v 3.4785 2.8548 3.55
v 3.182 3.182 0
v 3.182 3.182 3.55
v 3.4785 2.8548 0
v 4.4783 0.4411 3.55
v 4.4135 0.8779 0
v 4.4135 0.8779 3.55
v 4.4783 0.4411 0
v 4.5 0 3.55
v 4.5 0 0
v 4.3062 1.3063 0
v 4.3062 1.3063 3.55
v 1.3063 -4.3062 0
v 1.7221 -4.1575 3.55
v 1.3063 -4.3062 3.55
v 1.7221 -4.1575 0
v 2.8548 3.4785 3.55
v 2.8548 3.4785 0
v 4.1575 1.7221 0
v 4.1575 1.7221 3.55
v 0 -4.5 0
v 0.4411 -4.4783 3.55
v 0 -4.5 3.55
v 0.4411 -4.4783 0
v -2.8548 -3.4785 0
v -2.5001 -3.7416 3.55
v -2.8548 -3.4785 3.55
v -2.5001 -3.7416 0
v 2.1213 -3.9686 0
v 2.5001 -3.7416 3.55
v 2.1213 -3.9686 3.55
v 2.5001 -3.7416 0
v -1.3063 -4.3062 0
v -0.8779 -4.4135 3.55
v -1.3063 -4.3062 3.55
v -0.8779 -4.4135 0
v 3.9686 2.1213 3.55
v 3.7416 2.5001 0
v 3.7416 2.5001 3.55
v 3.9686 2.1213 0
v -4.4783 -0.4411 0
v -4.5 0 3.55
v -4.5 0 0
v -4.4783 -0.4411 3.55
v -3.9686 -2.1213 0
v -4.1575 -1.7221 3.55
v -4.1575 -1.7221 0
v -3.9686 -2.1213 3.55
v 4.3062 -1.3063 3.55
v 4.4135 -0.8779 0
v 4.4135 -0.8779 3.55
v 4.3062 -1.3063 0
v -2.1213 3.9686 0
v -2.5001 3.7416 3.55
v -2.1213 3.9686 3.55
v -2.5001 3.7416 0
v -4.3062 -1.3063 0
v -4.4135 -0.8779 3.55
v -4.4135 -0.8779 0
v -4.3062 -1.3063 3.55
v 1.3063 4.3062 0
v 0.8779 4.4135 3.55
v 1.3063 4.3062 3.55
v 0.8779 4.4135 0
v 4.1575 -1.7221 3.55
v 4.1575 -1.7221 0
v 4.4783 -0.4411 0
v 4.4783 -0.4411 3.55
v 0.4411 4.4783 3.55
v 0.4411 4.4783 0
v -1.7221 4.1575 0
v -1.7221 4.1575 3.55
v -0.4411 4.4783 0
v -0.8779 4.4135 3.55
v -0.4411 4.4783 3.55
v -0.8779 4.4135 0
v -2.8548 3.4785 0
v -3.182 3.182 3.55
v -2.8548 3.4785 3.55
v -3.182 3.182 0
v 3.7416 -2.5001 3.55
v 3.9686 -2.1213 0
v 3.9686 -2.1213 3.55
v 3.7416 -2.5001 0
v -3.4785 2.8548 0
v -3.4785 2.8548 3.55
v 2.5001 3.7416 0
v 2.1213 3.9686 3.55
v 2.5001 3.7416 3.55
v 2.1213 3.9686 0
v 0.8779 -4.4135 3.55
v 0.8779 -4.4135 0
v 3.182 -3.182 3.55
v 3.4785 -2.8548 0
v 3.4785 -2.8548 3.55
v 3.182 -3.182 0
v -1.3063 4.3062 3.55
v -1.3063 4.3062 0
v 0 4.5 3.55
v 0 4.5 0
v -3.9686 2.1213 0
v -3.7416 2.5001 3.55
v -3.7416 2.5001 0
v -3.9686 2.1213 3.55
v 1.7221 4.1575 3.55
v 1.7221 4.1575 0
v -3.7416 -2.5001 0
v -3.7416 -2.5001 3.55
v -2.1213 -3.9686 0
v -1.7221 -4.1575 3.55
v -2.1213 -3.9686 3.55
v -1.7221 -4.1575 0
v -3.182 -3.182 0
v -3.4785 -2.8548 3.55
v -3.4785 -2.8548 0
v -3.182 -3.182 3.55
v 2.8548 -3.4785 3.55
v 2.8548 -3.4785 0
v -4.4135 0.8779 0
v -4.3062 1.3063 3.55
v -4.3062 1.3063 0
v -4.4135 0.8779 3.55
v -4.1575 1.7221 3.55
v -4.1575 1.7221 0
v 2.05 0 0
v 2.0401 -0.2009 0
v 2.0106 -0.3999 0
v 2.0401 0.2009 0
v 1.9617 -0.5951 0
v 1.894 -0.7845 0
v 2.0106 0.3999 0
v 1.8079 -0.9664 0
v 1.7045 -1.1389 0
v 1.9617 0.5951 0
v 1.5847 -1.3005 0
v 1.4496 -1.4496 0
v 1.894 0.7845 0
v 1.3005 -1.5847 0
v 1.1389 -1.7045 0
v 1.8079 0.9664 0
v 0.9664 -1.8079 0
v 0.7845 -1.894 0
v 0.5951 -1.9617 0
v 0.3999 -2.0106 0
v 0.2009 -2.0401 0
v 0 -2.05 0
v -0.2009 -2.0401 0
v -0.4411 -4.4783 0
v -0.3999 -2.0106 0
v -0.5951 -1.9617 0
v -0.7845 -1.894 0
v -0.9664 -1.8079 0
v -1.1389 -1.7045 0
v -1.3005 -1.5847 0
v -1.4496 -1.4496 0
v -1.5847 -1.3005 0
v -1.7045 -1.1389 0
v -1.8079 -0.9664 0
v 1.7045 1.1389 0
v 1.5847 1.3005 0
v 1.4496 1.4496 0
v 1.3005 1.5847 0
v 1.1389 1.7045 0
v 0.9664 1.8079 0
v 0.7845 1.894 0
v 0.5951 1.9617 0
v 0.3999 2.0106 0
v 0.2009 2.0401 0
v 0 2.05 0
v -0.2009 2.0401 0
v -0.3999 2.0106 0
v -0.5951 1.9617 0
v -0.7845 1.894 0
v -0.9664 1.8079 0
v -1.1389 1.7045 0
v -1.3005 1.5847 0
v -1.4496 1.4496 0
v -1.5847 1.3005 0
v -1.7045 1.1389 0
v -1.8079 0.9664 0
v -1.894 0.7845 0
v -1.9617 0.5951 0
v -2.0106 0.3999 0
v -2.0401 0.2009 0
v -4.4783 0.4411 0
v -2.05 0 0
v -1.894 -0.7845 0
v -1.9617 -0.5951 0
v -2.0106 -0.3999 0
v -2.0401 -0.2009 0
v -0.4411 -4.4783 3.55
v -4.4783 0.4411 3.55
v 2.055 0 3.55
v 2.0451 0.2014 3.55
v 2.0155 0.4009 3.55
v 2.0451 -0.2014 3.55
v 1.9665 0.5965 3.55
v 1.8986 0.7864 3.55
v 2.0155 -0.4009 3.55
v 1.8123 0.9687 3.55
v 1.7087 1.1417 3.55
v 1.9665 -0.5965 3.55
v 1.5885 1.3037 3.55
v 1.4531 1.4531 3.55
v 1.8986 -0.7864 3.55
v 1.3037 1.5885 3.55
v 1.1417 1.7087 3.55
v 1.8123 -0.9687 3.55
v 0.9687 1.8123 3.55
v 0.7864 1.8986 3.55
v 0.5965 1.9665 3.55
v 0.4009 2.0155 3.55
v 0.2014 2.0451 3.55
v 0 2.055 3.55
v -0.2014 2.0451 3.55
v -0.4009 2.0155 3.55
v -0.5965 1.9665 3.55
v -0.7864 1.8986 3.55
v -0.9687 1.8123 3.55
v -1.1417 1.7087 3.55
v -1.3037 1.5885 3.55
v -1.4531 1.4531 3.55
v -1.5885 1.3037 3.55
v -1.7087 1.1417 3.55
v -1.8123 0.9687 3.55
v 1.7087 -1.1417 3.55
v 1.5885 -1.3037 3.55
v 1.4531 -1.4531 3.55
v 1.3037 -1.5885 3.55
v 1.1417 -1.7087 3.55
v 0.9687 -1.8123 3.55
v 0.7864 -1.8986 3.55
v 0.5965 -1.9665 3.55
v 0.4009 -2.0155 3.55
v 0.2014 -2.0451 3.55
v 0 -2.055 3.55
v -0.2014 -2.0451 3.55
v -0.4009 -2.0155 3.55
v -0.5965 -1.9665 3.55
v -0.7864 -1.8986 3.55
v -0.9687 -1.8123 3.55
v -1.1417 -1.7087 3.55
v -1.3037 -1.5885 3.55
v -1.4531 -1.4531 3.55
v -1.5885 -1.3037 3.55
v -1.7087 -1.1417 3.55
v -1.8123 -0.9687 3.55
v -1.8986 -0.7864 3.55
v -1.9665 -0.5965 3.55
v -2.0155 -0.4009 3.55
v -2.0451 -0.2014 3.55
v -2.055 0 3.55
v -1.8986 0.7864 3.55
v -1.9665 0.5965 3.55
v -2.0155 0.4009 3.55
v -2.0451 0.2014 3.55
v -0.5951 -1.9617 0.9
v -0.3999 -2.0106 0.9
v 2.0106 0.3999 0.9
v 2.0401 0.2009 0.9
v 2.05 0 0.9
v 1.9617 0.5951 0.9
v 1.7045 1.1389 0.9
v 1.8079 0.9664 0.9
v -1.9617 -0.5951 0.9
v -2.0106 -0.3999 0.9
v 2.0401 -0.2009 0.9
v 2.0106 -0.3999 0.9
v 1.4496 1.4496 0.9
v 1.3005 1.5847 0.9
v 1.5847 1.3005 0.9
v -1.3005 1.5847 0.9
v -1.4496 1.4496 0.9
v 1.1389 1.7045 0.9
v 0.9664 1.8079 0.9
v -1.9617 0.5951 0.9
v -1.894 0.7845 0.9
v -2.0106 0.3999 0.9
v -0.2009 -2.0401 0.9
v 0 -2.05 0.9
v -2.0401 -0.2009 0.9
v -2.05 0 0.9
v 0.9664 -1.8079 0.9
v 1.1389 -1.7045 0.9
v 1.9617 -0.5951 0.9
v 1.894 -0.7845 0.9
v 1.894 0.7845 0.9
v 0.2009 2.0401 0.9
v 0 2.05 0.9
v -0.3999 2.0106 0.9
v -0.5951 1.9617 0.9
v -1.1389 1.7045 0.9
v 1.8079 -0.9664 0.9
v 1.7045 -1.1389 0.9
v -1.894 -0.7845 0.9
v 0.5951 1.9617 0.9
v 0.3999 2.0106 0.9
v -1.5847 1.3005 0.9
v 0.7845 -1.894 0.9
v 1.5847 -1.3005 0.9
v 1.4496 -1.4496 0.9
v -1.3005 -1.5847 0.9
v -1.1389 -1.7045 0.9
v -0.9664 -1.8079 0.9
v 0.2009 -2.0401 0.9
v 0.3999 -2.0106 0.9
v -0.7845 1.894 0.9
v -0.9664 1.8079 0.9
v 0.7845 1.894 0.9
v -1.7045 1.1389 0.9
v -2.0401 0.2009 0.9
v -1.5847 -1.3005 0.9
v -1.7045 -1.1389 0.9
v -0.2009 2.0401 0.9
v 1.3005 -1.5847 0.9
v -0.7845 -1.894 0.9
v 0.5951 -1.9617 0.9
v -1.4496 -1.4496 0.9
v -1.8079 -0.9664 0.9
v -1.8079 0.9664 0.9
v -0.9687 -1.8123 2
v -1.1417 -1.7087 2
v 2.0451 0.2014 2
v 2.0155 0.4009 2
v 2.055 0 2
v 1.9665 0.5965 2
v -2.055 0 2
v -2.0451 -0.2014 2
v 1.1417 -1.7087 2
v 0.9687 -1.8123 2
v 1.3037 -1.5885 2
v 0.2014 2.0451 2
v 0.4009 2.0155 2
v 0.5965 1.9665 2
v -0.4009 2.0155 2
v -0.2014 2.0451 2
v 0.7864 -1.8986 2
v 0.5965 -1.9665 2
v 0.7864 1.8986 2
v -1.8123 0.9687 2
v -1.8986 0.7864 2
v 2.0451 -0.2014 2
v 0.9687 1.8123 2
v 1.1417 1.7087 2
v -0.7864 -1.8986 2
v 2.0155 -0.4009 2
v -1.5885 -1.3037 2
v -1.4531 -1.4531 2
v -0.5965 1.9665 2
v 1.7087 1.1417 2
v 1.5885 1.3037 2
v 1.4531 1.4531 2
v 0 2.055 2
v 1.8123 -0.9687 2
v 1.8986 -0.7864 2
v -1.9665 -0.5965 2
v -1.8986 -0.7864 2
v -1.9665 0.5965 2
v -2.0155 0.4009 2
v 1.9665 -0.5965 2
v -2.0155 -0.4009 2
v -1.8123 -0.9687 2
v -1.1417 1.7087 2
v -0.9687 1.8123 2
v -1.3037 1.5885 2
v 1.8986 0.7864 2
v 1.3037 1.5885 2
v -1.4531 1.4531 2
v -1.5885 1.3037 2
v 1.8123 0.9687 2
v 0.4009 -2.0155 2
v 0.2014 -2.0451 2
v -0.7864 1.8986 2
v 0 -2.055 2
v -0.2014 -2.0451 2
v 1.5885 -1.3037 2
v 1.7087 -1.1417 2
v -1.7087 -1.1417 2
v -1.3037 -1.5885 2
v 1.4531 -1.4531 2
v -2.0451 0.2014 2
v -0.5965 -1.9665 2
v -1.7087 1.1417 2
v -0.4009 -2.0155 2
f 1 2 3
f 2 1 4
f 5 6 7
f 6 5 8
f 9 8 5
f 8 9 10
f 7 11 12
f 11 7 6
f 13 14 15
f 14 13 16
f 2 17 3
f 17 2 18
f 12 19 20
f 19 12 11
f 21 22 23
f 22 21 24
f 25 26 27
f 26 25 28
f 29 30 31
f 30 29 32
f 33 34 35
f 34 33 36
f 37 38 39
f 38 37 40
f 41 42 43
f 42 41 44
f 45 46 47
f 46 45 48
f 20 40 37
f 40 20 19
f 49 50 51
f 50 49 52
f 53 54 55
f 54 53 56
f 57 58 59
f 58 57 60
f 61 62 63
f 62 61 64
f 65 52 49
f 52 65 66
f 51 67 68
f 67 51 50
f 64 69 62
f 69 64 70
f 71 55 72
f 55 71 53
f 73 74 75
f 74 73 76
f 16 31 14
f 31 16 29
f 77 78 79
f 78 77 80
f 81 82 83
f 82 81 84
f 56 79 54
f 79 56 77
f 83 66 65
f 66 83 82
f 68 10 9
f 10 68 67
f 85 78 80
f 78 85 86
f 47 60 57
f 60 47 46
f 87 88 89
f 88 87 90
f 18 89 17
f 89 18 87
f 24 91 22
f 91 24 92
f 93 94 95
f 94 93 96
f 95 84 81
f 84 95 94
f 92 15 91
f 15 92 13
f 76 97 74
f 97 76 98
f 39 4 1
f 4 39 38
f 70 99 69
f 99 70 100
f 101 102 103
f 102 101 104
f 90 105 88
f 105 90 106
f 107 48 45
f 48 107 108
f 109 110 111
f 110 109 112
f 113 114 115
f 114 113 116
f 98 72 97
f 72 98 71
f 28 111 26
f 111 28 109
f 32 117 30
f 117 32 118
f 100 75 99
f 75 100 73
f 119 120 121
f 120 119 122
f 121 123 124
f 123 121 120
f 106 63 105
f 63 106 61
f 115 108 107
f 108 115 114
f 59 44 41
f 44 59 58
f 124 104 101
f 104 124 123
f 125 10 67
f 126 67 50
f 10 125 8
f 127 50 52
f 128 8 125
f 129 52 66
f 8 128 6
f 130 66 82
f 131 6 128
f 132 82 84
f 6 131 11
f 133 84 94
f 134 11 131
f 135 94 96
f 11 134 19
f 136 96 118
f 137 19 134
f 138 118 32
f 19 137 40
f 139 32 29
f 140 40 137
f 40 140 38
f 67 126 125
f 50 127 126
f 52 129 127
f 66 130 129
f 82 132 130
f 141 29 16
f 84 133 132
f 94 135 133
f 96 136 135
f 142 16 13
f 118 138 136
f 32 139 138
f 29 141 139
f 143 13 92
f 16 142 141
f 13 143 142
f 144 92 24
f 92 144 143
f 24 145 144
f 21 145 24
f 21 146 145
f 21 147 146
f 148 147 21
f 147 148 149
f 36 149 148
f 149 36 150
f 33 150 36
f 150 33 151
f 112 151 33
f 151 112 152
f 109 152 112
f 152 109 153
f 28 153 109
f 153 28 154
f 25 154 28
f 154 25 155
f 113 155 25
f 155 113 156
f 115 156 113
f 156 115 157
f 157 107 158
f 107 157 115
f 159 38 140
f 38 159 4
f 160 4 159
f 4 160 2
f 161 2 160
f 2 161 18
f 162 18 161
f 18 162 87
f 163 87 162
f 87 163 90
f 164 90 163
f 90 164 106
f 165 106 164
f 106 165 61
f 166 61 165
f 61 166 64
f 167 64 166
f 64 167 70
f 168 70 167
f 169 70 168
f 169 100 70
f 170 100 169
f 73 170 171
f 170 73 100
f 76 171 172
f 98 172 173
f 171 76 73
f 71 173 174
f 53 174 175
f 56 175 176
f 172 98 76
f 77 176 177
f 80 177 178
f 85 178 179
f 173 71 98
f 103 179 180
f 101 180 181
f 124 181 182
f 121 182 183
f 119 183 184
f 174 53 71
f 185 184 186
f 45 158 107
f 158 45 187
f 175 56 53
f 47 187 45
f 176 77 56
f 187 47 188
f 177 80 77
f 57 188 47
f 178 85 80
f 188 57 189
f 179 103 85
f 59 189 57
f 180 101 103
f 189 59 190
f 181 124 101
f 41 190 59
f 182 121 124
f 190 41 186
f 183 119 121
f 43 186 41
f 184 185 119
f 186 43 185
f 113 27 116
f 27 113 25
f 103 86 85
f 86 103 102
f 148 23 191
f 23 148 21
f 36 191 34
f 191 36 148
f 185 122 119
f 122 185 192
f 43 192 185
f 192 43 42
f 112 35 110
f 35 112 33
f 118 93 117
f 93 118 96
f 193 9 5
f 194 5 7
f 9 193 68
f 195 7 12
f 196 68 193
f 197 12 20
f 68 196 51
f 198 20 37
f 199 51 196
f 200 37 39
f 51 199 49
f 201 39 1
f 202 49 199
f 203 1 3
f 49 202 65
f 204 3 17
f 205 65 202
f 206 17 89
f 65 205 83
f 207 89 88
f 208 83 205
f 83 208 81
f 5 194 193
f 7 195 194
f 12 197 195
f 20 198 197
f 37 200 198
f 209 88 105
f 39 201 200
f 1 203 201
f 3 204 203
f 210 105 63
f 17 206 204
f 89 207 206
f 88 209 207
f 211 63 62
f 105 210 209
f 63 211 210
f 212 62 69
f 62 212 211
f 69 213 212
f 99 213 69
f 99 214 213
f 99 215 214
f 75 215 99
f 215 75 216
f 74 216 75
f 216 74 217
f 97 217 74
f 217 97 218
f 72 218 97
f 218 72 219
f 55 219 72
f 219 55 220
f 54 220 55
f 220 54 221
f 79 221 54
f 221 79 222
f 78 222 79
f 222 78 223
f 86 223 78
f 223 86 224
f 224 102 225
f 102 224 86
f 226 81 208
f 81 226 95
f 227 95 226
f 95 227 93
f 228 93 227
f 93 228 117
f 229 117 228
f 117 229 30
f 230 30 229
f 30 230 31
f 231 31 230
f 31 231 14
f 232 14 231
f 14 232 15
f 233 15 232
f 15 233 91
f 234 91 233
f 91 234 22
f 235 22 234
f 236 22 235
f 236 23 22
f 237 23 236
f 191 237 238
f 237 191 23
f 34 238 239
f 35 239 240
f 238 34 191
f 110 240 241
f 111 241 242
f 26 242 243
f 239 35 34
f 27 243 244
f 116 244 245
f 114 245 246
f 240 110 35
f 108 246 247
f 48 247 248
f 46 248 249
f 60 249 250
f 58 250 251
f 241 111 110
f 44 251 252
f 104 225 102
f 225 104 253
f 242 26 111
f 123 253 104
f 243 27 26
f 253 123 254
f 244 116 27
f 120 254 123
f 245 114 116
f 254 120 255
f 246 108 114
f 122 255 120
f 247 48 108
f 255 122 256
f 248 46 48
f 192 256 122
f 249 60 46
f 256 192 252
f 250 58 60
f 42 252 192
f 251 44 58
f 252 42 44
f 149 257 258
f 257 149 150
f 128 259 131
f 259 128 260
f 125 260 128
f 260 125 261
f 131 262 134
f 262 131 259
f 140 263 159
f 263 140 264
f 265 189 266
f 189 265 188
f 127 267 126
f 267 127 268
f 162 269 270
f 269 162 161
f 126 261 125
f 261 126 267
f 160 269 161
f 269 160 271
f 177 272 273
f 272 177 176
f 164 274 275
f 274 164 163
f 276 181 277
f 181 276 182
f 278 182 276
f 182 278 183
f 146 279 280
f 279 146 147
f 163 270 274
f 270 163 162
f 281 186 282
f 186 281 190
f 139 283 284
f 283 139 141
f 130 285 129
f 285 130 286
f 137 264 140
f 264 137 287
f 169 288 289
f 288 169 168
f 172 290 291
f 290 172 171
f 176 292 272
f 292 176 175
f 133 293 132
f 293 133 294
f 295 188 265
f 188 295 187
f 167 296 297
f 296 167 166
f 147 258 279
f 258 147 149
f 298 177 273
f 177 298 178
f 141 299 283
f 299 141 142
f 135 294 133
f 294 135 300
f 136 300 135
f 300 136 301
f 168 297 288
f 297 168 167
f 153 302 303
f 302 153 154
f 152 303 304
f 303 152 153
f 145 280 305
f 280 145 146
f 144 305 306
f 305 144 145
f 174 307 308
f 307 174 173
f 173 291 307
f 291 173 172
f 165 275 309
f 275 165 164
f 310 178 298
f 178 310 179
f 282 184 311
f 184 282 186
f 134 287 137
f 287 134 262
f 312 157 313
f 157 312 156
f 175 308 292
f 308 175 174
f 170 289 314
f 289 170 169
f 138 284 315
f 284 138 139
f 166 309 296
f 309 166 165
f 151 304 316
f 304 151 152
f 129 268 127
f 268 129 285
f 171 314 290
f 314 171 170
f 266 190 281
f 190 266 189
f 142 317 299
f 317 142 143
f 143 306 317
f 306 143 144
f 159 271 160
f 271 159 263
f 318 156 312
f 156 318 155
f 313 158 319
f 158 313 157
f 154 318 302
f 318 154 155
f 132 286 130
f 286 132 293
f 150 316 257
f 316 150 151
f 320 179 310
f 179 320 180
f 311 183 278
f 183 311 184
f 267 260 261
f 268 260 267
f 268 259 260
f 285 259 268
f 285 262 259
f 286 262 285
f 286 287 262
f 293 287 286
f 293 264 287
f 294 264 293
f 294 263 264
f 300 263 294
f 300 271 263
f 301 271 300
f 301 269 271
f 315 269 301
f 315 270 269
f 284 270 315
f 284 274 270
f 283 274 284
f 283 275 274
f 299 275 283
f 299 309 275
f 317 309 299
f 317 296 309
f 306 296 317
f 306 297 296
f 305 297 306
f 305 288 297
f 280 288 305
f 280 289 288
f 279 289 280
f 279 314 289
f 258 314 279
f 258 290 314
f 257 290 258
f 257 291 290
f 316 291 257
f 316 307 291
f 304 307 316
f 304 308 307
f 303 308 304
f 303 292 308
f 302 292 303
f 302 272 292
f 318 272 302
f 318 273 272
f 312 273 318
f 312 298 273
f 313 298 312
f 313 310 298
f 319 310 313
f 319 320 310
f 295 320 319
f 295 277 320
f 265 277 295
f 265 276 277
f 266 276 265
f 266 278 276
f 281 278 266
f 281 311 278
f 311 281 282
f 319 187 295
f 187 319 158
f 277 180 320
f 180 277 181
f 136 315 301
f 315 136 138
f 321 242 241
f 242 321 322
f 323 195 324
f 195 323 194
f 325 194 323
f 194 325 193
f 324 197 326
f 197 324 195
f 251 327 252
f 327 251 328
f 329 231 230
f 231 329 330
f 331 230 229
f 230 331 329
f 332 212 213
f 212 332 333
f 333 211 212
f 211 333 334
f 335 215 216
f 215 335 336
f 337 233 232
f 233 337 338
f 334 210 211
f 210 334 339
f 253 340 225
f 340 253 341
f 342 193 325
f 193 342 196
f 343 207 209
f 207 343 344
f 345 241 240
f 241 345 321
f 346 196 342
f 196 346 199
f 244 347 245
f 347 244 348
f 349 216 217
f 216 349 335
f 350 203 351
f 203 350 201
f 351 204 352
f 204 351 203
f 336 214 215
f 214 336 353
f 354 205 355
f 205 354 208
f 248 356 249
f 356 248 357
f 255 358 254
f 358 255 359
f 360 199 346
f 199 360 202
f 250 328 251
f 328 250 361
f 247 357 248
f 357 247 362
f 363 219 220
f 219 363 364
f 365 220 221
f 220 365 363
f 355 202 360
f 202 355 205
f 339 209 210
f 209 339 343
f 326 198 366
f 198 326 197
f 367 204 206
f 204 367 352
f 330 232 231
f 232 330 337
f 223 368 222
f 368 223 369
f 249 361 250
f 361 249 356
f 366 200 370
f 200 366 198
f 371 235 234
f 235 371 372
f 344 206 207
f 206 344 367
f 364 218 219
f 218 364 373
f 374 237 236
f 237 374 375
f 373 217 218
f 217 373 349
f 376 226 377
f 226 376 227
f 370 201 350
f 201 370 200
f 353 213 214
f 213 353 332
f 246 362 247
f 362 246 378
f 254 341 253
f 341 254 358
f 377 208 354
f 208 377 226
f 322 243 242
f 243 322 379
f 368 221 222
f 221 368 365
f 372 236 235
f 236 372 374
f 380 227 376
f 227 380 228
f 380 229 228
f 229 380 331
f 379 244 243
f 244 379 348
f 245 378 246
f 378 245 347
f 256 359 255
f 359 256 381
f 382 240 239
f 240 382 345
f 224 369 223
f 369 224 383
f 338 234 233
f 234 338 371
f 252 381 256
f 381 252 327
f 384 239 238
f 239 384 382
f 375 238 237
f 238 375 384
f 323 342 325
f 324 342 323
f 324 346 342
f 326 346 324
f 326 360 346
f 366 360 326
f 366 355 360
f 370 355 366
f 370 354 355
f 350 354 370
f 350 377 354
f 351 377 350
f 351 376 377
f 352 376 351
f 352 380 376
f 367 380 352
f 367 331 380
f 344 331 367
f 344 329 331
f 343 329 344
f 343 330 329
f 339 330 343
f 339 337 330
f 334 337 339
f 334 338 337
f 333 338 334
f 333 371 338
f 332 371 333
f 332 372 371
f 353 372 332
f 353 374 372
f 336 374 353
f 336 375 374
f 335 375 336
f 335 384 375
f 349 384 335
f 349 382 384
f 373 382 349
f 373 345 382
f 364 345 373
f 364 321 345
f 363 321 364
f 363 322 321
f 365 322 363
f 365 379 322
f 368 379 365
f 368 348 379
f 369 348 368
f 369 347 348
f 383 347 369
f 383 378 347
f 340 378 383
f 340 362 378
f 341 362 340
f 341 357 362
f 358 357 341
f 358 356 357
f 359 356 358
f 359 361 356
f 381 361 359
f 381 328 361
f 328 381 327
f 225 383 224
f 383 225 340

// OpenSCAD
// Держатель магнита осевого энкодера. Open this file, F5 preview, F6 render, export STL.
use <reference_model.scad>
$fn=60;
rsgl_magnet_spacer();
